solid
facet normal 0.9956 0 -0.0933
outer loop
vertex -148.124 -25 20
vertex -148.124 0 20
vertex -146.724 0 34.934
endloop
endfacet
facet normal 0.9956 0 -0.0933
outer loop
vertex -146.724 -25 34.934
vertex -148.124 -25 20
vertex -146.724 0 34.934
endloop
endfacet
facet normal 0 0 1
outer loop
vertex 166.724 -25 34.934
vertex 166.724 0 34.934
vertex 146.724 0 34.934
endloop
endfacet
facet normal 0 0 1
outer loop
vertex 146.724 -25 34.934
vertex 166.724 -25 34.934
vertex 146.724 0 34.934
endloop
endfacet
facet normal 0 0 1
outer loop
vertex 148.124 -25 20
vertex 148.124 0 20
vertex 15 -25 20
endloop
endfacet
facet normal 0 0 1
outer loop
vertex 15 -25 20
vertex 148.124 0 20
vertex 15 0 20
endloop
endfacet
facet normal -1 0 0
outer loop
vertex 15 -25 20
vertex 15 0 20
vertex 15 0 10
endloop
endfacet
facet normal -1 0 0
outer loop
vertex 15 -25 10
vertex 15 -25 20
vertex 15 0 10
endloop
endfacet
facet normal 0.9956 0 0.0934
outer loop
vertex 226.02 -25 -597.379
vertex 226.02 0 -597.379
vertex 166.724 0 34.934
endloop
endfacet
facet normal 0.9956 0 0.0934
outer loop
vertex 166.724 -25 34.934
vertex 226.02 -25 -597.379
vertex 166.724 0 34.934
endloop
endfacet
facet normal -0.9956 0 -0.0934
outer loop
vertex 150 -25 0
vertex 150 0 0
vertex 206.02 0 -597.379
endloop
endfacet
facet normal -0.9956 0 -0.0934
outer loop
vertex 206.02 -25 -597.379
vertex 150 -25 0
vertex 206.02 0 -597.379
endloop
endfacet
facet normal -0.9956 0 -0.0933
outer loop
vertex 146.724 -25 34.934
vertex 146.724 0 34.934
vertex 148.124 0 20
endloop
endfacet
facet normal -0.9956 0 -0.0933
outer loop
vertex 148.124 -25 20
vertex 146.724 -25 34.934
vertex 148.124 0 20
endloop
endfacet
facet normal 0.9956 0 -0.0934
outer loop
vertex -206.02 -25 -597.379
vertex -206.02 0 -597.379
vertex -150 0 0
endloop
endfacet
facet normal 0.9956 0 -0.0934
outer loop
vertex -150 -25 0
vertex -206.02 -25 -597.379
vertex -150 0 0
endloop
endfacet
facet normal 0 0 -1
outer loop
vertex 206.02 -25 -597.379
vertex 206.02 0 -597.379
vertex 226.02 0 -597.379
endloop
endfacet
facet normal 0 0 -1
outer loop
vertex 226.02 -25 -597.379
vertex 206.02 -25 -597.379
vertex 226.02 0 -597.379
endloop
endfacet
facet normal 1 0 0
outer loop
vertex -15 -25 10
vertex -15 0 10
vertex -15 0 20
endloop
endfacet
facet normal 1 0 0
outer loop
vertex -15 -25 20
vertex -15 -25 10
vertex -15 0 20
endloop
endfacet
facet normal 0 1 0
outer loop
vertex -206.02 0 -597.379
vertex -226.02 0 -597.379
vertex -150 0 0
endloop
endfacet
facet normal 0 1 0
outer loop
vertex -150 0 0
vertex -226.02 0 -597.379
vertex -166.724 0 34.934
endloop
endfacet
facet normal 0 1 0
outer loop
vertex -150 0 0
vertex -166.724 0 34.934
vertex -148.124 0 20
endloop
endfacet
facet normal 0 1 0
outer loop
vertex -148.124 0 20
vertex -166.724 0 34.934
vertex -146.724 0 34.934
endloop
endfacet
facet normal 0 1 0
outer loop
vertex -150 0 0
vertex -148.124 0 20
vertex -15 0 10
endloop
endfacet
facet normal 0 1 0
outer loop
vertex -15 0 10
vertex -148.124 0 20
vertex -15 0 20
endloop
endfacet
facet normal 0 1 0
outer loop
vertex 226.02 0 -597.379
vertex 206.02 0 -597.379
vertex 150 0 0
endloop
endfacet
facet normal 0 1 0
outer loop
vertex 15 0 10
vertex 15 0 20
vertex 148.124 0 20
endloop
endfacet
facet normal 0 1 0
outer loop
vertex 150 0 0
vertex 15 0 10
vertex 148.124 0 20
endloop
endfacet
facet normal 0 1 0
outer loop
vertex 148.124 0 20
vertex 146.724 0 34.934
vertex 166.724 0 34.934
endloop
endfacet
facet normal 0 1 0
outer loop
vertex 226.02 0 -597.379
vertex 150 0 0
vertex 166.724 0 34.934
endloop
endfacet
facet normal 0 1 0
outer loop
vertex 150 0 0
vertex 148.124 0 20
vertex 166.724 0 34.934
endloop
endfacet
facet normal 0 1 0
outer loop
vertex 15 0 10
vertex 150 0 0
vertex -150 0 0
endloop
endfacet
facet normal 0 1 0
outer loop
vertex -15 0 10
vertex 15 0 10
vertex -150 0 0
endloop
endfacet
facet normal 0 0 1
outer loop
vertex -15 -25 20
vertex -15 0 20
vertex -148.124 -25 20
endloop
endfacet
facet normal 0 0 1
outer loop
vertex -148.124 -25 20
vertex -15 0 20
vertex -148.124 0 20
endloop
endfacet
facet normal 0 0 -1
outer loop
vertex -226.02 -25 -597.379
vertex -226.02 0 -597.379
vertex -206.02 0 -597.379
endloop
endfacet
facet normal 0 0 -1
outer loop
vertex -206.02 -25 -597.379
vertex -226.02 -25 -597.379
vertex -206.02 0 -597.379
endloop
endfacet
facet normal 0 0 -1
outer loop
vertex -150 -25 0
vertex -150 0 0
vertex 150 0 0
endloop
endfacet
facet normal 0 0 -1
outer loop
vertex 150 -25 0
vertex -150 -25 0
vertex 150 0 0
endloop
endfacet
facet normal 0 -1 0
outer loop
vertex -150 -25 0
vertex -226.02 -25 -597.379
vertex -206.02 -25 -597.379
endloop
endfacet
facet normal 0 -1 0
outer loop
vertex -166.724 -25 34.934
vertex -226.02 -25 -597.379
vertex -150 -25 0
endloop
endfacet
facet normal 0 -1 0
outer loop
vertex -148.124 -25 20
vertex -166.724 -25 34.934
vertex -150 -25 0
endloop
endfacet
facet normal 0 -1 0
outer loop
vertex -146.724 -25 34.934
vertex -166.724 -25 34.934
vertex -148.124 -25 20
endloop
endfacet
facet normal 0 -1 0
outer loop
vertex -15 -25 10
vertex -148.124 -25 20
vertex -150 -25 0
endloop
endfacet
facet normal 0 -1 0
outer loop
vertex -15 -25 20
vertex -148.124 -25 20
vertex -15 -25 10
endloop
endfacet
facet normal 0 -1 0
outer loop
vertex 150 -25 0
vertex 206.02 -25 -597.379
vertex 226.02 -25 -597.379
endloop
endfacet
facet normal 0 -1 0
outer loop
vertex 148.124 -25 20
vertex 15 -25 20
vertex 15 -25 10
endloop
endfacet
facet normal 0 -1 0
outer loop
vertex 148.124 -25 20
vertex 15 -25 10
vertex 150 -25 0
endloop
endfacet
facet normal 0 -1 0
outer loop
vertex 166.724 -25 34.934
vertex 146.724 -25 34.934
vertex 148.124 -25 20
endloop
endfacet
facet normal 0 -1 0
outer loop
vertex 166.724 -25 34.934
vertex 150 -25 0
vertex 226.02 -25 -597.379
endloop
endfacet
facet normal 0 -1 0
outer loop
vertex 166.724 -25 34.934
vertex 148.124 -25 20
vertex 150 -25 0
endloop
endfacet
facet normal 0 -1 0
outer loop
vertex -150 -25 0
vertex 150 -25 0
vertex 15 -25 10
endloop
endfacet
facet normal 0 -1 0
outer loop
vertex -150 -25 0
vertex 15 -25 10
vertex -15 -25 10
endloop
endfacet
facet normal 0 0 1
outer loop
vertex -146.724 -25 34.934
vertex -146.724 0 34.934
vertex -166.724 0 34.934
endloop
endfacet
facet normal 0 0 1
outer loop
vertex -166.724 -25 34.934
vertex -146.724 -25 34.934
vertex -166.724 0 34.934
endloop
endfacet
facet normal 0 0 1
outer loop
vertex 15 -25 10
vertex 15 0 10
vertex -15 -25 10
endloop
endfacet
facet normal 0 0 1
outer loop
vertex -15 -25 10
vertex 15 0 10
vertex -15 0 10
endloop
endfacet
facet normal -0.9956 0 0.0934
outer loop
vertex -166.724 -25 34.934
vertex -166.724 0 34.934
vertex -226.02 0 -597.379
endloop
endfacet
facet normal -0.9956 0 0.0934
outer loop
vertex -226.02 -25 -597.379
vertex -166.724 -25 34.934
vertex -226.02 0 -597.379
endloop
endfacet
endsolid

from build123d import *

# Parameters (mm, degrees)
F1_DEPTH = 25


with BuildPart() as f1:
    # F0 (on Front) → F1 (new body)
    with BuildSketch(Plane.XZ):
        Polygon((-150, 0), (0, 0), (150, 0), (206.01979, -597.379095), (226.01979, -597.379095), (166.723986, 34.934477), (146.723986, 34.934477), (148.124481, 20), (15, 20), (15, 10), (0, 10), (-15, 10), (-15, 20), (-15.339315, 20), (-148.124481, 20), (-146.723986, 34.934477), (-166.723986, 34.934477), (-226.01979, -597.379095), (-206.01979, -597.379095), align=None)
    extrude(amount=F1_DEPTH)


solid = f1.part
